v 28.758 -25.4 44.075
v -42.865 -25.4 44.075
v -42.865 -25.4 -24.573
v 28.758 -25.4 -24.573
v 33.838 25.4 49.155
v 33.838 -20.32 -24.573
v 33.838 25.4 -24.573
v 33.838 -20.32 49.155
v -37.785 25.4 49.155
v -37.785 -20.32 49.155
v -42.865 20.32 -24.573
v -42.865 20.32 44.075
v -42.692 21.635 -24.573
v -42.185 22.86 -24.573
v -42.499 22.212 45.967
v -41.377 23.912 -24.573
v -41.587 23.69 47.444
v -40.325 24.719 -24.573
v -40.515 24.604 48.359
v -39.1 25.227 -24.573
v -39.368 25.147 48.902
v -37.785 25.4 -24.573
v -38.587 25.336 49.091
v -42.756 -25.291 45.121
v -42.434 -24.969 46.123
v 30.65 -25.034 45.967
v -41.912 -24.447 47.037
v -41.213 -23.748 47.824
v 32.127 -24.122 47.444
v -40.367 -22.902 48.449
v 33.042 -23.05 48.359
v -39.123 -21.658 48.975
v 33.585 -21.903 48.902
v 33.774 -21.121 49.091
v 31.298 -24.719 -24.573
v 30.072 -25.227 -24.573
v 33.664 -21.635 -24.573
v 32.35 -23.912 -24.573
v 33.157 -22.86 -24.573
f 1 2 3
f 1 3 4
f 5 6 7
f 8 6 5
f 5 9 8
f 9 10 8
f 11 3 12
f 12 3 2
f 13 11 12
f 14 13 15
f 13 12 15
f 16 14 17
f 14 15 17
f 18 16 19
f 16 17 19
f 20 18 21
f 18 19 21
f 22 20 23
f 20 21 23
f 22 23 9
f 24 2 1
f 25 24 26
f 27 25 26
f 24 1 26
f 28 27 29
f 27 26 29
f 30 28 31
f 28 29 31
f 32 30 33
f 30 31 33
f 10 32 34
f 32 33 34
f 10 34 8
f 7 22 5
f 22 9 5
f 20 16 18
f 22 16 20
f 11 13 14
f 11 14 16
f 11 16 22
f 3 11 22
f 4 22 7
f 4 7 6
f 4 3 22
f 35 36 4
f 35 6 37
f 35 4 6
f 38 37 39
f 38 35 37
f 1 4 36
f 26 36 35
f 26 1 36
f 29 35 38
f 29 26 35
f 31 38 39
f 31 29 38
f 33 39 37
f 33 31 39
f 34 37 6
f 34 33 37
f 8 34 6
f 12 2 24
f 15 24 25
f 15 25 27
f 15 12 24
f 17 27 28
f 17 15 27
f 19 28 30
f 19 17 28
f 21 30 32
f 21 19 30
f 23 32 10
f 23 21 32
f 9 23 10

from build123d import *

# Parameters (mm, degrees)
F0_W     = 76.702643
F0_H     = 73.727116
F1_DEPTH = 25.4
F2_R     = 5.08


with BuildPart() as f1:
    # F0 (on Front) → F1 (new body, symmetric)
    with BuildSketch(Plane.XZ):
        with Locations((-4.513773, 12.29101)):
            Rectangle(F0_W, F0_H)
    extrude(amount=F1_DEPTH, both=True)

    # F2
    f2_edges = [f1.edges().sort_by_distance(p)[0] for p in [
        (33.837549, -25.4, 12.29101),
        (-4.513772, -25.4, 49.154568),
        (-42.865094, 0, 49.154568),
        (-42.865094, 25.4, 12.29101),
    ]]
    fillet(f2_edges, radius=F2_R)


solid = f1.part
